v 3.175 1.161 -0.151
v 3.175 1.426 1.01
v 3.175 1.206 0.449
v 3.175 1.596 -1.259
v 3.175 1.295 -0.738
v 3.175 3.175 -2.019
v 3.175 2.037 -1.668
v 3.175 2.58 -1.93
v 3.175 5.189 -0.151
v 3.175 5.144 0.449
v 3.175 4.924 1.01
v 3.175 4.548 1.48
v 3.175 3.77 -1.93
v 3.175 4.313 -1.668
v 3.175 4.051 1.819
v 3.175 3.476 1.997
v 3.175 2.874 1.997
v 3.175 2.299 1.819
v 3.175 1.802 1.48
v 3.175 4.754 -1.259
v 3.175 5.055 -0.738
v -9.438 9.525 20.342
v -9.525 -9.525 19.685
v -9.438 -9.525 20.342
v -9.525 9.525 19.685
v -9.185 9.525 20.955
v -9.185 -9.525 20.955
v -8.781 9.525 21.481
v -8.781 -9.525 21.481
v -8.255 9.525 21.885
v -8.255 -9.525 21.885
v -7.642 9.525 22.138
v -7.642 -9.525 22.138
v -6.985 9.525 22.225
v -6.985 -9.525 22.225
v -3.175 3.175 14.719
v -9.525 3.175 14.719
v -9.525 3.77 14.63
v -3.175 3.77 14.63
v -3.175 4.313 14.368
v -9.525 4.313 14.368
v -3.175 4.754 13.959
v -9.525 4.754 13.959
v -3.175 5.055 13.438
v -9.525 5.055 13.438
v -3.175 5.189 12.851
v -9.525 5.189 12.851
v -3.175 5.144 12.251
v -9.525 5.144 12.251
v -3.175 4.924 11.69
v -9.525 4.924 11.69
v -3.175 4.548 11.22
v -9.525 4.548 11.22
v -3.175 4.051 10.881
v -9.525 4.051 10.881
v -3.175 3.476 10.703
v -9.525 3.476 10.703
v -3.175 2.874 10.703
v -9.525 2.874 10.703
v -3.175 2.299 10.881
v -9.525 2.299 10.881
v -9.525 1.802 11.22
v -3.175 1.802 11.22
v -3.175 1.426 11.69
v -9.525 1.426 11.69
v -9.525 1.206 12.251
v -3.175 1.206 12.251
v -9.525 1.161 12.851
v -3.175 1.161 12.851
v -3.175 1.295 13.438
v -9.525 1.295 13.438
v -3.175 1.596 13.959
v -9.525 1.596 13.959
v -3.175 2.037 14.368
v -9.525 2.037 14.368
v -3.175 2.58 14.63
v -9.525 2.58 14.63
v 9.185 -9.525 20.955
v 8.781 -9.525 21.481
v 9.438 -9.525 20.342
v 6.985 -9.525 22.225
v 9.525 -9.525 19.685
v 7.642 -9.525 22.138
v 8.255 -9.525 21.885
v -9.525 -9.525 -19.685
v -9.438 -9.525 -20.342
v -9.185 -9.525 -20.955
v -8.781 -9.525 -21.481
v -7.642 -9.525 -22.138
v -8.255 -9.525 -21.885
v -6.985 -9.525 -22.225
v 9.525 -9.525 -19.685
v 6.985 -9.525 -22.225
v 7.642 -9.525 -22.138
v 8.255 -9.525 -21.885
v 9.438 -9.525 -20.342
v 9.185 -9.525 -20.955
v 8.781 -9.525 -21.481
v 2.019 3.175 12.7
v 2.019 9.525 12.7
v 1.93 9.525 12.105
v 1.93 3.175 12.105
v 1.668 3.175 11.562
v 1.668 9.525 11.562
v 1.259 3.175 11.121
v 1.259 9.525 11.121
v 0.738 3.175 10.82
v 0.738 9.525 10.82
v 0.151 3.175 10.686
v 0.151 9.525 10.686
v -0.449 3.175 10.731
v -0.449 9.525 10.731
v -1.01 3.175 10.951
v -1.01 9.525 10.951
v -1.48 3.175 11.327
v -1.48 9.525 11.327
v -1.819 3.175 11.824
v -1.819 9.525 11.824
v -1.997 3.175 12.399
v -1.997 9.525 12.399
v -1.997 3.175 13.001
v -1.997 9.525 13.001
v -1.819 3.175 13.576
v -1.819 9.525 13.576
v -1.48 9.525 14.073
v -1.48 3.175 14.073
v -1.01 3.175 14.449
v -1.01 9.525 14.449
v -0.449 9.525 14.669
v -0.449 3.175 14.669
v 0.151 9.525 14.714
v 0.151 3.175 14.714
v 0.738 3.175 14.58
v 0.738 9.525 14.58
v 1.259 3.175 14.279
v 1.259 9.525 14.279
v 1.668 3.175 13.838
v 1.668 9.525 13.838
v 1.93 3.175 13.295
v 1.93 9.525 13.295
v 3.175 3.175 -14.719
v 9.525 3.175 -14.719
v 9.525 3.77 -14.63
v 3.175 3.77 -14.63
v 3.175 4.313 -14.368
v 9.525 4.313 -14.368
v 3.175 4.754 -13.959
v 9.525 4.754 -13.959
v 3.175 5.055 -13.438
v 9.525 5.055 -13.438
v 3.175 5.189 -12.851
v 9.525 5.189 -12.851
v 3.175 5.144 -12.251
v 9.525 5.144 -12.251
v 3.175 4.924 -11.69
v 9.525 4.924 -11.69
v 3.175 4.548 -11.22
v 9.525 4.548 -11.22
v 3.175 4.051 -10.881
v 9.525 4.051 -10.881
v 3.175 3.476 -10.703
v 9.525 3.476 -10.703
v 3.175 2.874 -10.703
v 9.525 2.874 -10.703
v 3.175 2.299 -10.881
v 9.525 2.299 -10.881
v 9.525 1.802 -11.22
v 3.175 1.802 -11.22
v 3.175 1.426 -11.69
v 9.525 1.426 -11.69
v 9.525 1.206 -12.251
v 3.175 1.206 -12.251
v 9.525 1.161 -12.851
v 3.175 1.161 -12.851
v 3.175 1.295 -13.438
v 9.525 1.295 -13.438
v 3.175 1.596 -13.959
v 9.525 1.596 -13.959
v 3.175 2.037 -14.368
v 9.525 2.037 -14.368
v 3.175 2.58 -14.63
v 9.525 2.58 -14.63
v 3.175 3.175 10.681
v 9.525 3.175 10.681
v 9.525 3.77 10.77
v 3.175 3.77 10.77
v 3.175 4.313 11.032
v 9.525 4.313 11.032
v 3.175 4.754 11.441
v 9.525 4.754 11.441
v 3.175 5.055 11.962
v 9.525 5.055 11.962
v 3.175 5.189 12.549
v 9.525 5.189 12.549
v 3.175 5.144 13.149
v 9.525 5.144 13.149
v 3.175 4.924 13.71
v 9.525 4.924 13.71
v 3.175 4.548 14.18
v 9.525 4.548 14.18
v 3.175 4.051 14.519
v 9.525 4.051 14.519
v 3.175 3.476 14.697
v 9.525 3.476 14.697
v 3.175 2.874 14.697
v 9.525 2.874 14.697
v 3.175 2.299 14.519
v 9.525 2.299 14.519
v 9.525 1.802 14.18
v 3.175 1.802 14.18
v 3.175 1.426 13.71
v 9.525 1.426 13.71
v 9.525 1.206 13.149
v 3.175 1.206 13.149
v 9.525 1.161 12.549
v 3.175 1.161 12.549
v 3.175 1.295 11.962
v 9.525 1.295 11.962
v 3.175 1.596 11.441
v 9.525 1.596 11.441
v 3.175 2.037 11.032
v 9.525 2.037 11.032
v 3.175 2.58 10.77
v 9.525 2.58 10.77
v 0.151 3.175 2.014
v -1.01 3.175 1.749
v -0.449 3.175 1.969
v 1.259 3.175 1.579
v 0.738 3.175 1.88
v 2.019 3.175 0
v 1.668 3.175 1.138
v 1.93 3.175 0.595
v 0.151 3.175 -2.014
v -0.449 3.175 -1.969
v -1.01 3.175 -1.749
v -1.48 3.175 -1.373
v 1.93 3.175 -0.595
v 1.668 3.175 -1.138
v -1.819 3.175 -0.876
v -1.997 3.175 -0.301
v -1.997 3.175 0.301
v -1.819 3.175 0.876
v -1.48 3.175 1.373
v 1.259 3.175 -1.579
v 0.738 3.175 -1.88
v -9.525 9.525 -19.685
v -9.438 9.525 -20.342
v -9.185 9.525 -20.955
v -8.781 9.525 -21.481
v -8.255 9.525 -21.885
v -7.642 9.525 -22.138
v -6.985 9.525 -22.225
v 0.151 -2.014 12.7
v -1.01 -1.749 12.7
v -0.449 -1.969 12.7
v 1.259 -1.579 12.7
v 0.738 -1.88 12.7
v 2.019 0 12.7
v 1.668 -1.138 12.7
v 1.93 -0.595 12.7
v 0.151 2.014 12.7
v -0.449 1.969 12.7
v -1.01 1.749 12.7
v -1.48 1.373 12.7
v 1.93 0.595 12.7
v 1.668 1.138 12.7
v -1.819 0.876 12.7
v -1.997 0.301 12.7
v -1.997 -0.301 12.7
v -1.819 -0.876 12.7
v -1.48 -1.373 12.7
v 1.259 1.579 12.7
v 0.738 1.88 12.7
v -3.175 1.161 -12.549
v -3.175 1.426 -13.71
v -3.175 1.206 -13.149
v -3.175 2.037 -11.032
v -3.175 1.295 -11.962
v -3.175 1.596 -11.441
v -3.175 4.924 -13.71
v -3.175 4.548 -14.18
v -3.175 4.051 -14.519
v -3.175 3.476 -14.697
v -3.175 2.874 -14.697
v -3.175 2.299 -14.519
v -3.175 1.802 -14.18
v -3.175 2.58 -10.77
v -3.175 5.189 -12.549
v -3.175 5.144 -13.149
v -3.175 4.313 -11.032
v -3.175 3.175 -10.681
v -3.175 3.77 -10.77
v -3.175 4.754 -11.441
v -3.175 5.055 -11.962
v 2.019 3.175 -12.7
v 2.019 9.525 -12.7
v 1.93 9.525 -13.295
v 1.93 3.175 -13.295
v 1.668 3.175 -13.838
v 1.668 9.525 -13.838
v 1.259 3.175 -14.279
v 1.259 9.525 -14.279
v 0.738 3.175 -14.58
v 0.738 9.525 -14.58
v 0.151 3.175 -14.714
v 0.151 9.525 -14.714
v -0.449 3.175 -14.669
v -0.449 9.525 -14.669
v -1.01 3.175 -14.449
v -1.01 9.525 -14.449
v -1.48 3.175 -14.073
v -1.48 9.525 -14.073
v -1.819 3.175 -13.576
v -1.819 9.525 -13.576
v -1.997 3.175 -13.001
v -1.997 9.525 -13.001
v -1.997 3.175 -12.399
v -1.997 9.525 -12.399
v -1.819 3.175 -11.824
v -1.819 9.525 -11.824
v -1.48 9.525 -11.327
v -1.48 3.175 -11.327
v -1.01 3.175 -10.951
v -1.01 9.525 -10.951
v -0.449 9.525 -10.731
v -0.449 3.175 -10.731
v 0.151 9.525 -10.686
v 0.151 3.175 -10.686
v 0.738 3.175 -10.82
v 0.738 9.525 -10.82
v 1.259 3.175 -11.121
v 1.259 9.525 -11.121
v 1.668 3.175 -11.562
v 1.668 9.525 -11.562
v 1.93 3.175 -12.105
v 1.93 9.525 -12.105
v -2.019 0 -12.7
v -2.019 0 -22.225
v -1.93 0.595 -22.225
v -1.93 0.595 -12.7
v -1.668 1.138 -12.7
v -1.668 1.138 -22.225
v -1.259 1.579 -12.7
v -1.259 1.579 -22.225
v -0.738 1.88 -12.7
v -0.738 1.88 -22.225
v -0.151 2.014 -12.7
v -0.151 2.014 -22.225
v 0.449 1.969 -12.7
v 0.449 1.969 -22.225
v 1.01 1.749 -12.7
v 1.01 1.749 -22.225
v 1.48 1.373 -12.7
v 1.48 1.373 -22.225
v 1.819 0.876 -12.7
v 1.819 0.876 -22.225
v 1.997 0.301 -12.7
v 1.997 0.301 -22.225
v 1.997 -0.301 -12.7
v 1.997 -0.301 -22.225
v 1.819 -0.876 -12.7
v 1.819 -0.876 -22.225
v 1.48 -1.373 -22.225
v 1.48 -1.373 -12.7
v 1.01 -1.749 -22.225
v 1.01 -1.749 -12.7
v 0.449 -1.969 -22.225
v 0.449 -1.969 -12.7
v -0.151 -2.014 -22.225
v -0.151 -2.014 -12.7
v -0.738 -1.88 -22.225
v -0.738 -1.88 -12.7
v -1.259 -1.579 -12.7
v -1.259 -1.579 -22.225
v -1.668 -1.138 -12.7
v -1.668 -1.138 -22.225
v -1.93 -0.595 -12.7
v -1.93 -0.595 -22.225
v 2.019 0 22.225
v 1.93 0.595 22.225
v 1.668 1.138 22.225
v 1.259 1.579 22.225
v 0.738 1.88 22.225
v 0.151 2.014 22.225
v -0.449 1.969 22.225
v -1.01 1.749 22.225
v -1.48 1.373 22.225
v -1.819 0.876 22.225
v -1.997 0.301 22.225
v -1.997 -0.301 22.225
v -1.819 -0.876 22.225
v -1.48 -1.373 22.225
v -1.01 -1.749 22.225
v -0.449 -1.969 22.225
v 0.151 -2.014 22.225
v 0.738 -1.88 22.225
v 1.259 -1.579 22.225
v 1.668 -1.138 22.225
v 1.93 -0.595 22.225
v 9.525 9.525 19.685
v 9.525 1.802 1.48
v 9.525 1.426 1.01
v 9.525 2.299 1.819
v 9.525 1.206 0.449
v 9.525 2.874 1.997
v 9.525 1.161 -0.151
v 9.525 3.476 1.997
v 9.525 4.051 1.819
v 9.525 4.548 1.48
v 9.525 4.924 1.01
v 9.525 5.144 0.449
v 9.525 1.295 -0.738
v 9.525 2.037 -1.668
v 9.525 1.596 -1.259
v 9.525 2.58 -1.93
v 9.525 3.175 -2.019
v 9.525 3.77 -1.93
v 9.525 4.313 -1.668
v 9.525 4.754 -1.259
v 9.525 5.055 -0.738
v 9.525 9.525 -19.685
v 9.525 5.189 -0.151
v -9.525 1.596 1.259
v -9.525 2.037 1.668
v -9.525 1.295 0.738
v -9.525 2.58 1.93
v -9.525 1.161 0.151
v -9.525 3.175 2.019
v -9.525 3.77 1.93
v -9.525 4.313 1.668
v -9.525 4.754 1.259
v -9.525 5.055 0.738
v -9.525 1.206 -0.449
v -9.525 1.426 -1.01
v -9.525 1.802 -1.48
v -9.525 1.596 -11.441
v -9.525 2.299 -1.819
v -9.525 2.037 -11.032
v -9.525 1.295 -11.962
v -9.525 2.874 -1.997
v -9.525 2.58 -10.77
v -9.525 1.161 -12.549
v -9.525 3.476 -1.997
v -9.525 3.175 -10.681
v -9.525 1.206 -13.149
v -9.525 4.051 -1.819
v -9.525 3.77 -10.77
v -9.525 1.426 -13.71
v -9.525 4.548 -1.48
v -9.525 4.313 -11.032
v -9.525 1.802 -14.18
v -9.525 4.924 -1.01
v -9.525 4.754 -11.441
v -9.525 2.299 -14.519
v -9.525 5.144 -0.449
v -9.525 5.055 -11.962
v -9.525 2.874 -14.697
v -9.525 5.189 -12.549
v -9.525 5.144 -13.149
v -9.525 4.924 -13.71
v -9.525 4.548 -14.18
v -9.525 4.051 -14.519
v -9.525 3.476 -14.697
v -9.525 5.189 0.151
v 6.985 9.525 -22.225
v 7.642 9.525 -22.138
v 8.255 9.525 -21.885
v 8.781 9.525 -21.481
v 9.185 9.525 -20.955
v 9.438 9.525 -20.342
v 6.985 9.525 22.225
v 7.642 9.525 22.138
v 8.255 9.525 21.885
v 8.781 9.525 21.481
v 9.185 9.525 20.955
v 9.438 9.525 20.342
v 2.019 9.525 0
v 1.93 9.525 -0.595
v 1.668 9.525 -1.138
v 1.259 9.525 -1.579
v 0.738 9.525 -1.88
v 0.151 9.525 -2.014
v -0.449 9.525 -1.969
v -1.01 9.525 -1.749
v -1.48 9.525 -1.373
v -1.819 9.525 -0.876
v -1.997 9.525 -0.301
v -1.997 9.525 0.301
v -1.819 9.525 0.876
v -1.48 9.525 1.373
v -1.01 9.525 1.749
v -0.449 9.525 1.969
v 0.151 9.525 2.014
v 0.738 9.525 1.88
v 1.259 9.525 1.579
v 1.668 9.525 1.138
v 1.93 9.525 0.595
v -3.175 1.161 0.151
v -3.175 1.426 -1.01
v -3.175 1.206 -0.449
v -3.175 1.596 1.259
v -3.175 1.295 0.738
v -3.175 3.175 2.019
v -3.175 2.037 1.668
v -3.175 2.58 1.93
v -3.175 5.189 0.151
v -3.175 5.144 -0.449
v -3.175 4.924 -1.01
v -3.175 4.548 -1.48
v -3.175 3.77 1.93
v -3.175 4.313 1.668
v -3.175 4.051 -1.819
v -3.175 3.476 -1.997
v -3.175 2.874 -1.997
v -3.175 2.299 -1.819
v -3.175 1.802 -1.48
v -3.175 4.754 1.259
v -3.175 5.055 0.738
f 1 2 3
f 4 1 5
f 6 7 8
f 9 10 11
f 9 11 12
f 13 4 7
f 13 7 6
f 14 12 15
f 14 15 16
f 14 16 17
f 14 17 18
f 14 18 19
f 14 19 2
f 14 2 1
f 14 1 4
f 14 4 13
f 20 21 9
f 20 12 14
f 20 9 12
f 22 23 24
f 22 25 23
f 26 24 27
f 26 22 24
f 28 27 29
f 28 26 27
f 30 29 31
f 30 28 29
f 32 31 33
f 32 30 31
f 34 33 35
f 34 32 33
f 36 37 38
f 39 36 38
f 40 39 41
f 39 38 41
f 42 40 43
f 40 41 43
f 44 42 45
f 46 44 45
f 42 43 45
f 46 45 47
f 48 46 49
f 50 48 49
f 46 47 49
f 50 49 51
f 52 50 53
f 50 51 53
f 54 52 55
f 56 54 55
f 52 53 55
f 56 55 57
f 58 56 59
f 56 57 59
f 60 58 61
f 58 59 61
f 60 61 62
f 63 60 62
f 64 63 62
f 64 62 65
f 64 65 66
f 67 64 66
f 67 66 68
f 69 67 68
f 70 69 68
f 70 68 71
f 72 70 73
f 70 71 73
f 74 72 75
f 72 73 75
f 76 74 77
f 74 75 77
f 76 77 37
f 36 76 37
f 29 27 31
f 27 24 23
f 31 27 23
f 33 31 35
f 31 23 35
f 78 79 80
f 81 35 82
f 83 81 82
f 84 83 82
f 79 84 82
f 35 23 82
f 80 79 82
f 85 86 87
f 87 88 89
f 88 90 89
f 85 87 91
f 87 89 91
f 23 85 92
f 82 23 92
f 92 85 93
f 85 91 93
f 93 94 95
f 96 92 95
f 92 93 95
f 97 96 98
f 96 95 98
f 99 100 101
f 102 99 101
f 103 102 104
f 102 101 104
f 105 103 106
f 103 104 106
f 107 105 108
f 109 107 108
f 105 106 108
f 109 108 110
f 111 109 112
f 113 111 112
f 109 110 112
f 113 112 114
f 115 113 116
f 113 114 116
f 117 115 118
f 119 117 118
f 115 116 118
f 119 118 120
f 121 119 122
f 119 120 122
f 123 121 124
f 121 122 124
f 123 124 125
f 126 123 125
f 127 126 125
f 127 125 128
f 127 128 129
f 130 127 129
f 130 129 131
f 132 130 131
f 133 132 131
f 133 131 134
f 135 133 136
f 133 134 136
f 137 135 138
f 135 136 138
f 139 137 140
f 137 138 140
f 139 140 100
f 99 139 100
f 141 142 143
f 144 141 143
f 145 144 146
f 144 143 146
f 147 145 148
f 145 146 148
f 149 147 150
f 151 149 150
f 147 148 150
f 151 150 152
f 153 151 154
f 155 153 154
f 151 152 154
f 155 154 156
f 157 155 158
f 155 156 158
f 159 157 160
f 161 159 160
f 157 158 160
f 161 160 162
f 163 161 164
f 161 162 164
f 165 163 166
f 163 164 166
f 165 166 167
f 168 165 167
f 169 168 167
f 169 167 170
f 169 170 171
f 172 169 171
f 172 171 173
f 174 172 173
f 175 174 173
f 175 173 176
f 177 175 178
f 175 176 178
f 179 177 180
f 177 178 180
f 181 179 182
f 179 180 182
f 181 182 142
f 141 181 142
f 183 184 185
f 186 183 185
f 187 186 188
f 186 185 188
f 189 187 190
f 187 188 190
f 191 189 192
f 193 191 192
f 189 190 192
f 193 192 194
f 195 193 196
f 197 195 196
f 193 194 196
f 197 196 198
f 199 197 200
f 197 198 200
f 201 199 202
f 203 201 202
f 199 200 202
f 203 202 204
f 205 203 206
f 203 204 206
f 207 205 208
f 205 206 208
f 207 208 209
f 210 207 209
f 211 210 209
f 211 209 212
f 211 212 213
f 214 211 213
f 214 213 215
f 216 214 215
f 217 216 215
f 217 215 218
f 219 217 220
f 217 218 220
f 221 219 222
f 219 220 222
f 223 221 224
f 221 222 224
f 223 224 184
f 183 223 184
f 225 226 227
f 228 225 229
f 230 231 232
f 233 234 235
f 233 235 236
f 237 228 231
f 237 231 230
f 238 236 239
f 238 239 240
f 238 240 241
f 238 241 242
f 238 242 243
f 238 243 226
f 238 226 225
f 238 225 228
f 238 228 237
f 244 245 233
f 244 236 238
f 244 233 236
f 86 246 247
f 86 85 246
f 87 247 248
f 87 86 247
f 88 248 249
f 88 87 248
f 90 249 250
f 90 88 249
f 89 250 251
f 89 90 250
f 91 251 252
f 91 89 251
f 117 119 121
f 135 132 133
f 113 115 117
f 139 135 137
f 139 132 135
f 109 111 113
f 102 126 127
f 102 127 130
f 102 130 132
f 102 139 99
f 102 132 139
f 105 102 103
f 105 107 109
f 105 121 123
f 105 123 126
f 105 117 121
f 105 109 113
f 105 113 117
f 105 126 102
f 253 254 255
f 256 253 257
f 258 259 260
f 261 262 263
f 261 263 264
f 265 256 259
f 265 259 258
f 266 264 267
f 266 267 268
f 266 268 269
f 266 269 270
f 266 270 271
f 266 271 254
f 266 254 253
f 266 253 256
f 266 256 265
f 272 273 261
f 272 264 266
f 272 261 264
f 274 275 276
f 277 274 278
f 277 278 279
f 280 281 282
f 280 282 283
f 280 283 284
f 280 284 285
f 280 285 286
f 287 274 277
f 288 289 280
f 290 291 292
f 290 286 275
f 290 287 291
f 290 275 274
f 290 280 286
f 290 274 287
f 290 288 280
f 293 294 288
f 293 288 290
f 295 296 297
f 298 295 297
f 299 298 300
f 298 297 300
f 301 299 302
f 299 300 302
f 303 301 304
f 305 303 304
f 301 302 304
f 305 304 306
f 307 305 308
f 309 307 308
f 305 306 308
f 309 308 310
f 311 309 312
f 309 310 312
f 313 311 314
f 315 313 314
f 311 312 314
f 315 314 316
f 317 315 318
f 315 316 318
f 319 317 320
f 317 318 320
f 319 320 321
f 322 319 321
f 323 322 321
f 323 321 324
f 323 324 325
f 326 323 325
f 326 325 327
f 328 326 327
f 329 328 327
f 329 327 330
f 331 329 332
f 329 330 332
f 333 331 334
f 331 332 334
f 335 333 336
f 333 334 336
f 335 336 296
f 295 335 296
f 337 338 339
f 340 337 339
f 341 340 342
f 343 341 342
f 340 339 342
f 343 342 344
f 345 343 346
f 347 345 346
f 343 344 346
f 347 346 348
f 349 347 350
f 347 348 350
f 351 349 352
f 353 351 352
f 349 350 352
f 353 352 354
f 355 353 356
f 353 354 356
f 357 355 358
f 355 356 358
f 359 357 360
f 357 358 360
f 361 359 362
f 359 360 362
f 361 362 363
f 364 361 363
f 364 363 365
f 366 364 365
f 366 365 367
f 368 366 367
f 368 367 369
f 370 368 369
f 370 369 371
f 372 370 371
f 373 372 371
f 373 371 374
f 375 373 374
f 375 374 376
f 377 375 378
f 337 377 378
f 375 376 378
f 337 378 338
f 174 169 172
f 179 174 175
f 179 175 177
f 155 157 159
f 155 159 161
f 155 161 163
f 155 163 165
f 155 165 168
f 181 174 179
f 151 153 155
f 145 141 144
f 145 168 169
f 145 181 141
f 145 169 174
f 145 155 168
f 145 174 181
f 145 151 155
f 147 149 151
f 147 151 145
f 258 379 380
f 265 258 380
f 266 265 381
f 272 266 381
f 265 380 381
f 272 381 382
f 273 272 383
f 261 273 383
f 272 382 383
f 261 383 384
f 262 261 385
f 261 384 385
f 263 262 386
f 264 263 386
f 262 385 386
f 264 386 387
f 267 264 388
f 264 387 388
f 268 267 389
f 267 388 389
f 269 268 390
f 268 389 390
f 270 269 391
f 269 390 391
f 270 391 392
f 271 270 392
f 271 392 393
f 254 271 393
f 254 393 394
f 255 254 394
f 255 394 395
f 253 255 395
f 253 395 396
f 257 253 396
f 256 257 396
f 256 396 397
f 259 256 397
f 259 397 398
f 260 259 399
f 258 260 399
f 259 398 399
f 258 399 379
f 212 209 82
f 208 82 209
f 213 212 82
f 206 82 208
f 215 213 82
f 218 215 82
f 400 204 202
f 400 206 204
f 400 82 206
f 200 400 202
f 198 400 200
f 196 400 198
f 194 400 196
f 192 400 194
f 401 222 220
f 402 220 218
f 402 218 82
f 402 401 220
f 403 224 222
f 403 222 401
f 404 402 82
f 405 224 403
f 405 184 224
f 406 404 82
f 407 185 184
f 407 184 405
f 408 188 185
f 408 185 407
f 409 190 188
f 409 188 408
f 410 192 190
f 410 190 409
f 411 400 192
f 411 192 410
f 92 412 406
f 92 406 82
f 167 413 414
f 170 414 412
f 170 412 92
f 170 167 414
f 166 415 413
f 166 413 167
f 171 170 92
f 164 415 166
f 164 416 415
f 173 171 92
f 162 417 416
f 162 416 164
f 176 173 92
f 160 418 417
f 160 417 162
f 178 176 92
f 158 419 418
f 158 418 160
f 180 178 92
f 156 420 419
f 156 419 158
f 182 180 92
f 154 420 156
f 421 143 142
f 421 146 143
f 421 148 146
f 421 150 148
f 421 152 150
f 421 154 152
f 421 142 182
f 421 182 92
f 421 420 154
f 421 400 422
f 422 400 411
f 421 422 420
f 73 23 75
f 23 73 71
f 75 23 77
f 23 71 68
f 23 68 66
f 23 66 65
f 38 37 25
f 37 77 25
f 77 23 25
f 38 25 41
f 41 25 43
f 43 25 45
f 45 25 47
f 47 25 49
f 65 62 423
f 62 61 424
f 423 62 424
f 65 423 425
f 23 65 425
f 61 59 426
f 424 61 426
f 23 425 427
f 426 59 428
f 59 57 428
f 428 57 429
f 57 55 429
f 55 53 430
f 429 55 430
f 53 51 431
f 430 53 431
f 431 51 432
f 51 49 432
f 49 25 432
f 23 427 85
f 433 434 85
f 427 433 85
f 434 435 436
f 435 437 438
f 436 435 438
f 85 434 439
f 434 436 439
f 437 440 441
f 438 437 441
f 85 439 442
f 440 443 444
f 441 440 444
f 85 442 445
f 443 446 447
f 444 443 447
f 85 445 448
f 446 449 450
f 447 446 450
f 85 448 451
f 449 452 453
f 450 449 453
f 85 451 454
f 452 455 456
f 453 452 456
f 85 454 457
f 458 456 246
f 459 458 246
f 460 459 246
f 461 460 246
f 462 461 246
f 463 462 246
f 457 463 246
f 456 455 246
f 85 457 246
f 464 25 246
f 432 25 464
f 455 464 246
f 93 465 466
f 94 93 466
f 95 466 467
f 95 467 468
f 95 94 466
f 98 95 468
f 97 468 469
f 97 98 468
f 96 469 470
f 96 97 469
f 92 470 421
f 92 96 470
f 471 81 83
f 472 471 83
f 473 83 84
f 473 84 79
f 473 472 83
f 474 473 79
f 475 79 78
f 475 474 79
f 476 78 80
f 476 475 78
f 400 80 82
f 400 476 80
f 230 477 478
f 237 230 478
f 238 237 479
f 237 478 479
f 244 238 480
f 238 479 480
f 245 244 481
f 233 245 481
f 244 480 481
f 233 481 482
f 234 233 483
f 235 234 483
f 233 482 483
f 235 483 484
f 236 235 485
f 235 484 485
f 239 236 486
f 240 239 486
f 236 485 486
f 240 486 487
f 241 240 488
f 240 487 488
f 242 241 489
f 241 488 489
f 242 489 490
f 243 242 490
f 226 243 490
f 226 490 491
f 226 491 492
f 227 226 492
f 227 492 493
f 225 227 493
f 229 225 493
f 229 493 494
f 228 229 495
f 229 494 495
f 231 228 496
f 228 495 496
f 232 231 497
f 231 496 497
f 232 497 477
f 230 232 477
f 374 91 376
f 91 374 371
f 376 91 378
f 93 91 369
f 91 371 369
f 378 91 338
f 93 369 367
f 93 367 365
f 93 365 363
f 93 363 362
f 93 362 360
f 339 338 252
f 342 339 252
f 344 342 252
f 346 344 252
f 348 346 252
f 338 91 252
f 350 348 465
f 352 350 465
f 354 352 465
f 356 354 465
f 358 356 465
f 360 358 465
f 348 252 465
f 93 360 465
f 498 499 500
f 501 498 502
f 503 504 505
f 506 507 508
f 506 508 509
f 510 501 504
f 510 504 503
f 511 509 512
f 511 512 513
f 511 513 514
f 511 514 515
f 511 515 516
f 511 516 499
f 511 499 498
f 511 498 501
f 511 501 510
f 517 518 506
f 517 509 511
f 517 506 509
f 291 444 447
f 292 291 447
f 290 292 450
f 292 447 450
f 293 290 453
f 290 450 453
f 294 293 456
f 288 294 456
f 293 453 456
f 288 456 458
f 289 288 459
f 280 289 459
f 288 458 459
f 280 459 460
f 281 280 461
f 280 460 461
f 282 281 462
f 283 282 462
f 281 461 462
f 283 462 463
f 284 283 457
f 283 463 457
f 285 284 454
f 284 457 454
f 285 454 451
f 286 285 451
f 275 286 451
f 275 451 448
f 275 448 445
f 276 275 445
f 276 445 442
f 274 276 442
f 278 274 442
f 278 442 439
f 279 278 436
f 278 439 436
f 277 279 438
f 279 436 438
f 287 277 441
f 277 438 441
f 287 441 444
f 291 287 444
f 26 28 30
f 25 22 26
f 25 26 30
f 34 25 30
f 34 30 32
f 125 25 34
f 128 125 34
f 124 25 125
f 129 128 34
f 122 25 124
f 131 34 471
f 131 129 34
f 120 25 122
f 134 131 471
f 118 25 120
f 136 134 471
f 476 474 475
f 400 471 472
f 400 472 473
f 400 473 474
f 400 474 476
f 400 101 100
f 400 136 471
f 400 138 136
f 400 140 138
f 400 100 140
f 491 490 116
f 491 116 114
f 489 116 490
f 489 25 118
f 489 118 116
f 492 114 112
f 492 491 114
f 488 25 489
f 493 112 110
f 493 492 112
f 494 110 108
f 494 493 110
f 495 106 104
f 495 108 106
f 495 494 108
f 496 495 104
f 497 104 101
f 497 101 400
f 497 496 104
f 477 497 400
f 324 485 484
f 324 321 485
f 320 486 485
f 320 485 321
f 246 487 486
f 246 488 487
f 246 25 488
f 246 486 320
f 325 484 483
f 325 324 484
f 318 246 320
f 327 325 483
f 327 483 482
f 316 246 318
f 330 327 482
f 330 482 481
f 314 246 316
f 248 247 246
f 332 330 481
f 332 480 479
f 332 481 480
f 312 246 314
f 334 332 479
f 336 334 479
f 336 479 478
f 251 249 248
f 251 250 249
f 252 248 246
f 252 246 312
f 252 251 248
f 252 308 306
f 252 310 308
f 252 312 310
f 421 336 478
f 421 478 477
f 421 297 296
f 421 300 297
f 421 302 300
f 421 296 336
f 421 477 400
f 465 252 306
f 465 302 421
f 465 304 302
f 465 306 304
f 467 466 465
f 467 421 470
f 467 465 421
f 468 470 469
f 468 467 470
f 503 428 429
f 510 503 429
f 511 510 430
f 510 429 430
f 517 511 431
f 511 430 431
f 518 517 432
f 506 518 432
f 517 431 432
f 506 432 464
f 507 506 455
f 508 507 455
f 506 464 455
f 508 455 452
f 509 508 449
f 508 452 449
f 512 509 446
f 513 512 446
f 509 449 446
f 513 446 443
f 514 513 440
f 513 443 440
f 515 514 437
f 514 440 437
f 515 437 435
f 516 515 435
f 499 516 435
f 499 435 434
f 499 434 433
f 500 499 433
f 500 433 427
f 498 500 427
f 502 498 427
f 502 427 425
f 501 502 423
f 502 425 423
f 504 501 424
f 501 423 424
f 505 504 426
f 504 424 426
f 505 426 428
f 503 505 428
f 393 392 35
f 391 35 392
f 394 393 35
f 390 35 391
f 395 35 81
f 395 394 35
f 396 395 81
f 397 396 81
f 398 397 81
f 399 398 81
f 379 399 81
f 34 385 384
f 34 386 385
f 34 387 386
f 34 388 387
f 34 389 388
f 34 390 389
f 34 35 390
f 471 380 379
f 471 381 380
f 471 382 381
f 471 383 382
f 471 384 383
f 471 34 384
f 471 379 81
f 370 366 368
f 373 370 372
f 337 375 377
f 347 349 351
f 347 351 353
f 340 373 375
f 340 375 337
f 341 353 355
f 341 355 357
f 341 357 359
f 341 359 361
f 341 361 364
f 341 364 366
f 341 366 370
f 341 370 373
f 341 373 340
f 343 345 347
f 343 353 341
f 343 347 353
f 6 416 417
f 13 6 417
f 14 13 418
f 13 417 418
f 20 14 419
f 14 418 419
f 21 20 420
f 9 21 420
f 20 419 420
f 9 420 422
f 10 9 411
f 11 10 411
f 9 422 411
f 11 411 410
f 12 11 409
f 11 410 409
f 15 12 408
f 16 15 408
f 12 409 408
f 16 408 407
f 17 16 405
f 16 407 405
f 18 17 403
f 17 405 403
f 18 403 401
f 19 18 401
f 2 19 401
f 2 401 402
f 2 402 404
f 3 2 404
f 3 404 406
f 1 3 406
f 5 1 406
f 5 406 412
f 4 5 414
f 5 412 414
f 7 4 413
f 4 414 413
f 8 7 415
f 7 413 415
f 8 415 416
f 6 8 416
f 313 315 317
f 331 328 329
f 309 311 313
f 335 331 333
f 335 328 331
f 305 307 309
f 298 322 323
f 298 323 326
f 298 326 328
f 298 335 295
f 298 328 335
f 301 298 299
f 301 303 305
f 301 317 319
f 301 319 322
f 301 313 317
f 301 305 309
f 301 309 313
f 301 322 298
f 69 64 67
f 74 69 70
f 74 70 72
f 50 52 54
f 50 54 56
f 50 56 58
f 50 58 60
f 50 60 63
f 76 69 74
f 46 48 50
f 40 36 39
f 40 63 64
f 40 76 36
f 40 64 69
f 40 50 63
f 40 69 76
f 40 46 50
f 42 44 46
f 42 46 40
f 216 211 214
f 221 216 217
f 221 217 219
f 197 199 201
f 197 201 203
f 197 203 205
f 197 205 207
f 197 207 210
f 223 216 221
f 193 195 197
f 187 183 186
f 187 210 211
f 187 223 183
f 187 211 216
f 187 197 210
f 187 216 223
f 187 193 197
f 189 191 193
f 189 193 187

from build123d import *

# Parameters (mm, degrees)
SKETCH1_W           = 19.05
SKETCH1_H           = 44.45
BOSS_EXTRUDE1_DEPTH = 9.525
SKETCH2_R           = 2.0193
CUT_EXTRUDE1_DEPTH  = 9.525
SKETCH3_R           = 2.0193
CUT_EXTRUDE2_DEPTH  = 9.525
SKETCH4_R           = 2.0193
CUT_EXTRUDE3_DEPTH  = 6.35
SKETCH5_R           = 2.0193
CUT_EXTRUDE4_DEPTH  = 6.35
SKETCH6_R           = 2.0193
CUT_EXTRUDE5_DEPTH  = 6.35
FILLET1_R           = 2.54


with BuildPart() as part:
    # Sketch1 → Boss-Extrude1 (new body, symmetric)
    with BuildSketch(Plane(origin=(0, 0, 0), x_dir=(1, 0, 0), z_dir=(0, 1, 0))):
        Rectangle(SKETCH1_W, SKETCH1_H)
    extrude(amount=BOSS_EXTRUDE1_DEPTH, both=True)

    # Sketch2 → Cut-Extrude1 (cut)
    with BuildSketch(Plane.XY.offset(22.225)):
        Circle(SKETCH2_R)
    extrude(amount=-CUT_EXTRUDE1_DEPTH, mode=Mode.SUBTRACT)

    # Sketch3 → Cut-Extrude2 (cut)
    with BuildSketch(Plane(origin=(0, 0, -22.225), x_dir=(-1, 0, 0), z_dir=(0, 0, -1))):
        Circle(SKETCH3_R)
    extrude(amount=-CUT_EXTRUDE2_DEPTH, mode=Mode.SUBTRACT)

    # Sketch4 → Cut-Extrude3 (cut)
    with BuildSketch(Plane(origin=(9.525, 0, 0), x_dir=(0, 0, -1), z_dir=(1, 0, 0))):
        with Locations((-12.7, 3.175)):
            Circle(SKETCH4_R)
        with Locations((12.7, 3.175)):
            Circle(SKETCH4_R)
        with Locations((0, 3.175)):
            Circle(SKETCH4_R)
    extrude(amount=-CUT_EXTRUDE3_DEPTH, mode=Mode.SUBTRACT)

    # Sketch5 → Cut-Extrude4 (cut)
    with BuildSketch(Plane.ZY.offset(9.525)):
        with Locations((-12.7, 3.175)):
            Circle(SKETCH5_R)
        with Locations((0, 3.175)):
            Circle(SKETCH5_R)
        with Locations((12.7, 3.175)):
            Circle(SKETCH5_R)
    extrude(amount=-CUT_EXTRUDE4_DEPTH, mode=Mode.SUBTRACT)

    # Sketch6 → Cut-Extrude5 (cut)
    with BuildSketch(Plane(origin=(0, 9.525, 0), x_dir=(1, 0, 0), z_dir=(0, 1, 0))):
        with Locations((0, 12.7)):
            Circle(SKETCH6_R)
        Circle(SKETCH6_R)
        with Locations((0, -12.7)):
            Circle(SKETCH6_R)
    extrude(amount=-CUT_EXTRUDE5_DEPTH, mode=Mode.SUBTRACT)

    # Fillet1
    fillet1_edges = [part.edges().sort_by_distance(p)[0] for p in [
        (9.525, 0, 22.225),
        (-9.525, 0, 22.225),
        (-9.525, 0, -22.225),
        (9.525, 0, -22.225),
    ]]
    fillet(fillet1_edges, radius=FILLET1_R)


solid = part.part
